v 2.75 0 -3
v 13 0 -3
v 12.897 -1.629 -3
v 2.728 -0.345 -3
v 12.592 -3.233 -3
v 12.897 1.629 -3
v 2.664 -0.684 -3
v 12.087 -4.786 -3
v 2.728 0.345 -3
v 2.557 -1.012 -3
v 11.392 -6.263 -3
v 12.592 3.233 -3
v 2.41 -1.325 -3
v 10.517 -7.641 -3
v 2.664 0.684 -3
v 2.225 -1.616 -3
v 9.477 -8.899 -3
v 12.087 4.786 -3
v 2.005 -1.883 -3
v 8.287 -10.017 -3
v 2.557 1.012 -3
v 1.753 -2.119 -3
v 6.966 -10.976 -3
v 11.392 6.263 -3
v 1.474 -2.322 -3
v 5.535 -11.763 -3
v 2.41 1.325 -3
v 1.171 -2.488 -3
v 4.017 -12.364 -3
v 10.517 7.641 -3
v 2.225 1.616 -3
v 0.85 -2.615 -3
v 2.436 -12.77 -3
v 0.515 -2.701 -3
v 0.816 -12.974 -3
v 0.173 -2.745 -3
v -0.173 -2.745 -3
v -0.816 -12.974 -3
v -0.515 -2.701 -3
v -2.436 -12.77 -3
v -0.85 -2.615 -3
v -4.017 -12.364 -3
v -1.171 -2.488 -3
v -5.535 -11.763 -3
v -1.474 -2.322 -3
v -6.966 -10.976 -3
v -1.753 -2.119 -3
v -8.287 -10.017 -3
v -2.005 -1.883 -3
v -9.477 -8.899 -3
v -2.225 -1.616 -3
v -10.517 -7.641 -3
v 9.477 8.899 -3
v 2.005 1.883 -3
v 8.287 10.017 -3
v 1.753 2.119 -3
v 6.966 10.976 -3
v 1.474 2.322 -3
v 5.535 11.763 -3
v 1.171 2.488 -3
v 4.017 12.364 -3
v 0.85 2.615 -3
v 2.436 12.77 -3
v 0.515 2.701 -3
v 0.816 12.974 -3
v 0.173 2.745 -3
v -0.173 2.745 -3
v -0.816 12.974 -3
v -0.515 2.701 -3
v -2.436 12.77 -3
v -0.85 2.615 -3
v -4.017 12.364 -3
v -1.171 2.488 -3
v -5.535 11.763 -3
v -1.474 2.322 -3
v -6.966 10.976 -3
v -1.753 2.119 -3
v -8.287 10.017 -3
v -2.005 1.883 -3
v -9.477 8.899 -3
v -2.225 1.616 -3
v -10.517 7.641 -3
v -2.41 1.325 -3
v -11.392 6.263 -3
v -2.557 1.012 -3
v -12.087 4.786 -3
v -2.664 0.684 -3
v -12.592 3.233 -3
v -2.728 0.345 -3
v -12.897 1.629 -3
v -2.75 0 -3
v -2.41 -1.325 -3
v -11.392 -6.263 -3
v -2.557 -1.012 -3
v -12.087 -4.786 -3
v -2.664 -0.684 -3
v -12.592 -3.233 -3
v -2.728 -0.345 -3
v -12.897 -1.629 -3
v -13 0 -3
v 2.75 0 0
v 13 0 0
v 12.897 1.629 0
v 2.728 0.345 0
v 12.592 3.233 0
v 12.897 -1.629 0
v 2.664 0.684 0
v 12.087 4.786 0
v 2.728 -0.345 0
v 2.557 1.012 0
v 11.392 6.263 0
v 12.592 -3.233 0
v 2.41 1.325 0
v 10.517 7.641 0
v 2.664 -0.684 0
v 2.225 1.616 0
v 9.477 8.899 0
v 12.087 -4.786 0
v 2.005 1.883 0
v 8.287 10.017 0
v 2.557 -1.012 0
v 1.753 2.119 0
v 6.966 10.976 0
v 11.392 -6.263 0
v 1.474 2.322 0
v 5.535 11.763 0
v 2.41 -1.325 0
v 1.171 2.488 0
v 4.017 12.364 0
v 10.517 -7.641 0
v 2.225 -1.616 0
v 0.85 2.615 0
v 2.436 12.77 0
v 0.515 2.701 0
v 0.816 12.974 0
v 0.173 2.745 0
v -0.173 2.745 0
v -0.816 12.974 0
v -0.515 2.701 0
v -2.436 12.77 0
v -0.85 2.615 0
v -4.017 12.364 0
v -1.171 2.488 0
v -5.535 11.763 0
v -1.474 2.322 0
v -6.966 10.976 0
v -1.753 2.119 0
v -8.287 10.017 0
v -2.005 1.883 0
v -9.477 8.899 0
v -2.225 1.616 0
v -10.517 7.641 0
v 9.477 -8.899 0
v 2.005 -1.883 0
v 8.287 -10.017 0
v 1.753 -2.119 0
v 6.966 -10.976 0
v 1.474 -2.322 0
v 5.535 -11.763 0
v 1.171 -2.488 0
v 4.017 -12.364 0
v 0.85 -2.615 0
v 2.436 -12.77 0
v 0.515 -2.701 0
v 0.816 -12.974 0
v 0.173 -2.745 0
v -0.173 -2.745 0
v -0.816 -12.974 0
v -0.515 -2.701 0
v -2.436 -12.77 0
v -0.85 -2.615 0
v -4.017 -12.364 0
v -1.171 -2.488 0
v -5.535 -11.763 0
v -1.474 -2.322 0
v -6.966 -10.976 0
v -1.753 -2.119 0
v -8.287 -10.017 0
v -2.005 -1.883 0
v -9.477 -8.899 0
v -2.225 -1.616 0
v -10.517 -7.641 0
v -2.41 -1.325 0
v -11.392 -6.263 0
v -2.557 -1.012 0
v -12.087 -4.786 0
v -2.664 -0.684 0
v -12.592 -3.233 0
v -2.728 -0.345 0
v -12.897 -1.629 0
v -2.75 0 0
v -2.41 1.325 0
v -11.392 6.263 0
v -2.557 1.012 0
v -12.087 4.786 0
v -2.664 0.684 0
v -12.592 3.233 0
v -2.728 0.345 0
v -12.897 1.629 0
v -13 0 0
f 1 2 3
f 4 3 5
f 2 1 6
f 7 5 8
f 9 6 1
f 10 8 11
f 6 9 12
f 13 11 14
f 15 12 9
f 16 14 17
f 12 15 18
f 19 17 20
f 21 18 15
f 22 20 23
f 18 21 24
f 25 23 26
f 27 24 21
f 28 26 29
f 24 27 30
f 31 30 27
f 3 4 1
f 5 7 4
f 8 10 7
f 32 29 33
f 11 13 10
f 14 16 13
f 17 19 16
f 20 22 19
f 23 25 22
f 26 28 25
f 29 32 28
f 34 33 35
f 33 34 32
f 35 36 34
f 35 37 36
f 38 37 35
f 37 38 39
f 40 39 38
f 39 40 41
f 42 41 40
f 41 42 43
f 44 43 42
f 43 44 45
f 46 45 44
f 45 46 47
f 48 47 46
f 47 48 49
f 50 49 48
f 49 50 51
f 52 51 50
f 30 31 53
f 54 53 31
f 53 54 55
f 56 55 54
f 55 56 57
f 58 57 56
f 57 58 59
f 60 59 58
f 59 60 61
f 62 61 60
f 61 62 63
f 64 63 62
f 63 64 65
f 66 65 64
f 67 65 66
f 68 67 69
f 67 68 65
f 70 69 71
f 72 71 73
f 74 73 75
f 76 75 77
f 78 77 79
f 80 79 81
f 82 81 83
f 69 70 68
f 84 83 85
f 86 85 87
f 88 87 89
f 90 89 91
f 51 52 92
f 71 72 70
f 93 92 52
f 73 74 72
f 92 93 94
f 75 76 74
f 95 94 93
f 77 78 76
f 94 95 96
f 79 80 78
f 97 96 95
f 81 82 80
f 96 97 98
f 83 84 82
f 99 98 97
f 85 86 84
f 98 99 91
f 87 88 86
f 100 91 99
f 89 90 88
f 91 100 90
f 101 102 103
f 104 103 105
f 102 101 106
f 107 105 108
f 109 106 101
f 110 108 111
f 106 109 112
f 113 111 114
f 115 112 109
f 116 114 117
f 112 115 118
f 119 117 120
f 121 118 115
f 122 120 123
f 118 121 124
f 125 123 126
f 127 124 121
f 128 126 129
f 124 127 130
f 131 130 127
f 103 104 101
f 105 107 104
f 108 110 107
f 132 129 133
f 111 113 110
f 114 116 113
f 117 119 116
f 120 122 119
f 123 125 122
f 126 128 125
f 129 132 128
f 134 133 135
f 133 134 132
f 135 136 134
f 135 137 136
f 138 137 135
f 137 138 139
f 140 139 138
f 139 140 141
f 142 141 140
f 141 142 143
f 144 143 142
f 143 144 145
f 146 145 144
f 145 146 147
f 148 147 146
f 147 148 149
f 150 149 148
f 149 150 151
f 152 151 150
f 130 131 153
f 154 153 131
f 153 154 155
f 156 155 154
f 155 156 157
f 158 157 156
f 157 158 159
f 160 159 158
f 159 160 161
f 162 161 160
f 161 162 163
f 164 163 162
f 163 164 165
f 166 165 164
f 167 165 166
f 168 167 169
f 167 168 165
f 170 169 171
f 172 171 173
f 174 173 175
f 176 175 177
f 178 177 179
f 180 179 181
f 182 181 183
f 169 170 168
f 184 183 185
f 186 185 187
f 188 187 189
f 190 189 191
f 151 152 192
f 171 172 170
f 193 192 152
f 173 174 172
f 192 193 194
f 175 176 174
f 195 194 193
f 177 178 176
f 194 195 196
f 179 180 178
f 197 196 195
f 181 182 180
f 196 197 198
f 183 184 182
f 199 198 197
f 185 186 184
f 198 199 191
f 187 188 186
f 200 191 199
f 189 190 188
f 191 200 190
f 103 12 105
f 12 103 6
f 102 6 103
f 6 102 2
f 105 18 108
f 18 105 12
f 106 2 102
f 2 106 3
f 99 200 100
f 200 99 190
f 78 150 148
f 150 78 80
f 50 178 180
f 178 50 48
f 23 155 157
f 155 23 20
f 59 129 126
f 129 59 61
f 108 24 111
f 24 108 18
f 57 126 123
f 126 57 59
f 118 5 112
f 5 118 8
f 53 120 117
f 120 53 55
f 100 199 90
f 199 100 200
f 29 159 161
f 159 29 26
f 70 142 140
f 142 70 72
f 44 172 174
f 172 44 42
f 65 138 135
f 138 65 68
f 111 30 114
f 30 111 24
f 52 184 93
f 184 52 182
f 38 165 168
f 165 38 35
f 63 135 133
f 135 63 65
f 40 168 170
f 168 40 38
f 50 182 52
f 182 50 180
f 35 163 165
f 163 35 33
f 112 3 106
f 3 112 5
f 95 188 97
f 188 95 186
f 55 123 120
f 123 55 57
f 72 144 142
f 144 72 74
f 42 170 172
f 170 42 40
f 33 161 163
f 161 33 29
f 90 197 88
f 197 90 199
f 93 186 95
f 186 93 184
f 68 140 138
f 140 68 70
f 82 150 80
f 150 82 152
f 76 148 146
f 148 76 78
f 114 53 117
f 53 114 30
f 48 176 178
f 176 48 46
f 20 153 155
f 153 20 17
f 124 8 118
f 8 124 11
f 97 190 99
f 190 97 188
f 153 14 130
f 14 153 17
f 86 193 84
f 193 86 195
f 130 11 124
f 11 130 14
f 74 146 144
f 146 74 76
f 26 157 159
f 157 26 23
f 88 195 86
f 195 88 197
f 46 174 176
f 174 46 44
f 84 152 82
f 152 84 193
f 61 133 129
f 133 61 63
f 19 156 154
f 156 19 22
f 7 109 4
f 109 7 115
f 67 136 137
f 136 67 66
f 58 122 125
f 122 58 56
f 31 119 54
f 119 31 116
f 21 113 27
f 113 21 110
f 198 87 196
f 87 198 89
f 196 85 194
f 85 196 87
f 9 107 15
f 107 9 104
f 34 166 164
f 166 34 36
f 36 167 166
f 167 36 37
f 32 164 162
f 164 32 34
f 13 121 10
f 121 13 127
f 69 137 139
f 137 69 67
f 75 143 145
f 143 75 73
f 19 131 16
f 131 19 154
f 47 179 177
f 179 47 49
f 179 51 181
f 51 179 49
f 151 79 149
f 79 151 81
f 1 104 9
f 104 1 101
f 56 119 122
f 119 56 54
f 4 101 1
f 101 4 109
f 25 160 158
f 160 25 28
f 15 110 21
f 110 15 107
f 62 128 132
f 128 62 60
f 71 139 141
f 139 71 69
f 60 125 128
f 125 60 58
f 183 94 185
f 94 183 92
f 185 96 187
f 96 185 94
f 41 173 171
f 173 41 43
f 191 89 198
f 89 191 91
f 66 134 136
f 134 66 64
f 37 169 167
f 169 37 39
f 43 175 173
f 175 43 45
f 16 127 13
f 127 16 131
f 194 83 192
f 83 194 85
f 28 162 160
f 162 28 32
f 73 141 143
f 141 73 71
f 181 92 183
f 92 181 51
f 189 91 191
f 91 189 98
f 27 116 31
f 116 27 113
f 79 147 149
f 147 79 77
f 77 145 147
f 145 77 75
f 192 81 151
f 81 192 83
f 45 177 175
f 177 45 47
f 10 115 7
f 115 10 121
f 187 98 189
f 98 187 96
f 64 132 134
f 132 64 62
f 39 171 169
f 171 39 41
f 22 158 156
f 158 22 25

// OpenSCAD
$fn = 50;


difference() {
	union() {
		translate(v = [0, 0, -3.0000000000]) {
			cylinder(h = 3, r = 7.0000000000);
		}
		translate(v = [0, 0, -3.0000000000]) {
			cylinder(h = 3, r = 13.0000000000);
		}
	}
	union() {
		#translate(v = [0, 0, -3]) {
			cylinder(h = 3, r = 2.7500000000);
		}
	}
}
